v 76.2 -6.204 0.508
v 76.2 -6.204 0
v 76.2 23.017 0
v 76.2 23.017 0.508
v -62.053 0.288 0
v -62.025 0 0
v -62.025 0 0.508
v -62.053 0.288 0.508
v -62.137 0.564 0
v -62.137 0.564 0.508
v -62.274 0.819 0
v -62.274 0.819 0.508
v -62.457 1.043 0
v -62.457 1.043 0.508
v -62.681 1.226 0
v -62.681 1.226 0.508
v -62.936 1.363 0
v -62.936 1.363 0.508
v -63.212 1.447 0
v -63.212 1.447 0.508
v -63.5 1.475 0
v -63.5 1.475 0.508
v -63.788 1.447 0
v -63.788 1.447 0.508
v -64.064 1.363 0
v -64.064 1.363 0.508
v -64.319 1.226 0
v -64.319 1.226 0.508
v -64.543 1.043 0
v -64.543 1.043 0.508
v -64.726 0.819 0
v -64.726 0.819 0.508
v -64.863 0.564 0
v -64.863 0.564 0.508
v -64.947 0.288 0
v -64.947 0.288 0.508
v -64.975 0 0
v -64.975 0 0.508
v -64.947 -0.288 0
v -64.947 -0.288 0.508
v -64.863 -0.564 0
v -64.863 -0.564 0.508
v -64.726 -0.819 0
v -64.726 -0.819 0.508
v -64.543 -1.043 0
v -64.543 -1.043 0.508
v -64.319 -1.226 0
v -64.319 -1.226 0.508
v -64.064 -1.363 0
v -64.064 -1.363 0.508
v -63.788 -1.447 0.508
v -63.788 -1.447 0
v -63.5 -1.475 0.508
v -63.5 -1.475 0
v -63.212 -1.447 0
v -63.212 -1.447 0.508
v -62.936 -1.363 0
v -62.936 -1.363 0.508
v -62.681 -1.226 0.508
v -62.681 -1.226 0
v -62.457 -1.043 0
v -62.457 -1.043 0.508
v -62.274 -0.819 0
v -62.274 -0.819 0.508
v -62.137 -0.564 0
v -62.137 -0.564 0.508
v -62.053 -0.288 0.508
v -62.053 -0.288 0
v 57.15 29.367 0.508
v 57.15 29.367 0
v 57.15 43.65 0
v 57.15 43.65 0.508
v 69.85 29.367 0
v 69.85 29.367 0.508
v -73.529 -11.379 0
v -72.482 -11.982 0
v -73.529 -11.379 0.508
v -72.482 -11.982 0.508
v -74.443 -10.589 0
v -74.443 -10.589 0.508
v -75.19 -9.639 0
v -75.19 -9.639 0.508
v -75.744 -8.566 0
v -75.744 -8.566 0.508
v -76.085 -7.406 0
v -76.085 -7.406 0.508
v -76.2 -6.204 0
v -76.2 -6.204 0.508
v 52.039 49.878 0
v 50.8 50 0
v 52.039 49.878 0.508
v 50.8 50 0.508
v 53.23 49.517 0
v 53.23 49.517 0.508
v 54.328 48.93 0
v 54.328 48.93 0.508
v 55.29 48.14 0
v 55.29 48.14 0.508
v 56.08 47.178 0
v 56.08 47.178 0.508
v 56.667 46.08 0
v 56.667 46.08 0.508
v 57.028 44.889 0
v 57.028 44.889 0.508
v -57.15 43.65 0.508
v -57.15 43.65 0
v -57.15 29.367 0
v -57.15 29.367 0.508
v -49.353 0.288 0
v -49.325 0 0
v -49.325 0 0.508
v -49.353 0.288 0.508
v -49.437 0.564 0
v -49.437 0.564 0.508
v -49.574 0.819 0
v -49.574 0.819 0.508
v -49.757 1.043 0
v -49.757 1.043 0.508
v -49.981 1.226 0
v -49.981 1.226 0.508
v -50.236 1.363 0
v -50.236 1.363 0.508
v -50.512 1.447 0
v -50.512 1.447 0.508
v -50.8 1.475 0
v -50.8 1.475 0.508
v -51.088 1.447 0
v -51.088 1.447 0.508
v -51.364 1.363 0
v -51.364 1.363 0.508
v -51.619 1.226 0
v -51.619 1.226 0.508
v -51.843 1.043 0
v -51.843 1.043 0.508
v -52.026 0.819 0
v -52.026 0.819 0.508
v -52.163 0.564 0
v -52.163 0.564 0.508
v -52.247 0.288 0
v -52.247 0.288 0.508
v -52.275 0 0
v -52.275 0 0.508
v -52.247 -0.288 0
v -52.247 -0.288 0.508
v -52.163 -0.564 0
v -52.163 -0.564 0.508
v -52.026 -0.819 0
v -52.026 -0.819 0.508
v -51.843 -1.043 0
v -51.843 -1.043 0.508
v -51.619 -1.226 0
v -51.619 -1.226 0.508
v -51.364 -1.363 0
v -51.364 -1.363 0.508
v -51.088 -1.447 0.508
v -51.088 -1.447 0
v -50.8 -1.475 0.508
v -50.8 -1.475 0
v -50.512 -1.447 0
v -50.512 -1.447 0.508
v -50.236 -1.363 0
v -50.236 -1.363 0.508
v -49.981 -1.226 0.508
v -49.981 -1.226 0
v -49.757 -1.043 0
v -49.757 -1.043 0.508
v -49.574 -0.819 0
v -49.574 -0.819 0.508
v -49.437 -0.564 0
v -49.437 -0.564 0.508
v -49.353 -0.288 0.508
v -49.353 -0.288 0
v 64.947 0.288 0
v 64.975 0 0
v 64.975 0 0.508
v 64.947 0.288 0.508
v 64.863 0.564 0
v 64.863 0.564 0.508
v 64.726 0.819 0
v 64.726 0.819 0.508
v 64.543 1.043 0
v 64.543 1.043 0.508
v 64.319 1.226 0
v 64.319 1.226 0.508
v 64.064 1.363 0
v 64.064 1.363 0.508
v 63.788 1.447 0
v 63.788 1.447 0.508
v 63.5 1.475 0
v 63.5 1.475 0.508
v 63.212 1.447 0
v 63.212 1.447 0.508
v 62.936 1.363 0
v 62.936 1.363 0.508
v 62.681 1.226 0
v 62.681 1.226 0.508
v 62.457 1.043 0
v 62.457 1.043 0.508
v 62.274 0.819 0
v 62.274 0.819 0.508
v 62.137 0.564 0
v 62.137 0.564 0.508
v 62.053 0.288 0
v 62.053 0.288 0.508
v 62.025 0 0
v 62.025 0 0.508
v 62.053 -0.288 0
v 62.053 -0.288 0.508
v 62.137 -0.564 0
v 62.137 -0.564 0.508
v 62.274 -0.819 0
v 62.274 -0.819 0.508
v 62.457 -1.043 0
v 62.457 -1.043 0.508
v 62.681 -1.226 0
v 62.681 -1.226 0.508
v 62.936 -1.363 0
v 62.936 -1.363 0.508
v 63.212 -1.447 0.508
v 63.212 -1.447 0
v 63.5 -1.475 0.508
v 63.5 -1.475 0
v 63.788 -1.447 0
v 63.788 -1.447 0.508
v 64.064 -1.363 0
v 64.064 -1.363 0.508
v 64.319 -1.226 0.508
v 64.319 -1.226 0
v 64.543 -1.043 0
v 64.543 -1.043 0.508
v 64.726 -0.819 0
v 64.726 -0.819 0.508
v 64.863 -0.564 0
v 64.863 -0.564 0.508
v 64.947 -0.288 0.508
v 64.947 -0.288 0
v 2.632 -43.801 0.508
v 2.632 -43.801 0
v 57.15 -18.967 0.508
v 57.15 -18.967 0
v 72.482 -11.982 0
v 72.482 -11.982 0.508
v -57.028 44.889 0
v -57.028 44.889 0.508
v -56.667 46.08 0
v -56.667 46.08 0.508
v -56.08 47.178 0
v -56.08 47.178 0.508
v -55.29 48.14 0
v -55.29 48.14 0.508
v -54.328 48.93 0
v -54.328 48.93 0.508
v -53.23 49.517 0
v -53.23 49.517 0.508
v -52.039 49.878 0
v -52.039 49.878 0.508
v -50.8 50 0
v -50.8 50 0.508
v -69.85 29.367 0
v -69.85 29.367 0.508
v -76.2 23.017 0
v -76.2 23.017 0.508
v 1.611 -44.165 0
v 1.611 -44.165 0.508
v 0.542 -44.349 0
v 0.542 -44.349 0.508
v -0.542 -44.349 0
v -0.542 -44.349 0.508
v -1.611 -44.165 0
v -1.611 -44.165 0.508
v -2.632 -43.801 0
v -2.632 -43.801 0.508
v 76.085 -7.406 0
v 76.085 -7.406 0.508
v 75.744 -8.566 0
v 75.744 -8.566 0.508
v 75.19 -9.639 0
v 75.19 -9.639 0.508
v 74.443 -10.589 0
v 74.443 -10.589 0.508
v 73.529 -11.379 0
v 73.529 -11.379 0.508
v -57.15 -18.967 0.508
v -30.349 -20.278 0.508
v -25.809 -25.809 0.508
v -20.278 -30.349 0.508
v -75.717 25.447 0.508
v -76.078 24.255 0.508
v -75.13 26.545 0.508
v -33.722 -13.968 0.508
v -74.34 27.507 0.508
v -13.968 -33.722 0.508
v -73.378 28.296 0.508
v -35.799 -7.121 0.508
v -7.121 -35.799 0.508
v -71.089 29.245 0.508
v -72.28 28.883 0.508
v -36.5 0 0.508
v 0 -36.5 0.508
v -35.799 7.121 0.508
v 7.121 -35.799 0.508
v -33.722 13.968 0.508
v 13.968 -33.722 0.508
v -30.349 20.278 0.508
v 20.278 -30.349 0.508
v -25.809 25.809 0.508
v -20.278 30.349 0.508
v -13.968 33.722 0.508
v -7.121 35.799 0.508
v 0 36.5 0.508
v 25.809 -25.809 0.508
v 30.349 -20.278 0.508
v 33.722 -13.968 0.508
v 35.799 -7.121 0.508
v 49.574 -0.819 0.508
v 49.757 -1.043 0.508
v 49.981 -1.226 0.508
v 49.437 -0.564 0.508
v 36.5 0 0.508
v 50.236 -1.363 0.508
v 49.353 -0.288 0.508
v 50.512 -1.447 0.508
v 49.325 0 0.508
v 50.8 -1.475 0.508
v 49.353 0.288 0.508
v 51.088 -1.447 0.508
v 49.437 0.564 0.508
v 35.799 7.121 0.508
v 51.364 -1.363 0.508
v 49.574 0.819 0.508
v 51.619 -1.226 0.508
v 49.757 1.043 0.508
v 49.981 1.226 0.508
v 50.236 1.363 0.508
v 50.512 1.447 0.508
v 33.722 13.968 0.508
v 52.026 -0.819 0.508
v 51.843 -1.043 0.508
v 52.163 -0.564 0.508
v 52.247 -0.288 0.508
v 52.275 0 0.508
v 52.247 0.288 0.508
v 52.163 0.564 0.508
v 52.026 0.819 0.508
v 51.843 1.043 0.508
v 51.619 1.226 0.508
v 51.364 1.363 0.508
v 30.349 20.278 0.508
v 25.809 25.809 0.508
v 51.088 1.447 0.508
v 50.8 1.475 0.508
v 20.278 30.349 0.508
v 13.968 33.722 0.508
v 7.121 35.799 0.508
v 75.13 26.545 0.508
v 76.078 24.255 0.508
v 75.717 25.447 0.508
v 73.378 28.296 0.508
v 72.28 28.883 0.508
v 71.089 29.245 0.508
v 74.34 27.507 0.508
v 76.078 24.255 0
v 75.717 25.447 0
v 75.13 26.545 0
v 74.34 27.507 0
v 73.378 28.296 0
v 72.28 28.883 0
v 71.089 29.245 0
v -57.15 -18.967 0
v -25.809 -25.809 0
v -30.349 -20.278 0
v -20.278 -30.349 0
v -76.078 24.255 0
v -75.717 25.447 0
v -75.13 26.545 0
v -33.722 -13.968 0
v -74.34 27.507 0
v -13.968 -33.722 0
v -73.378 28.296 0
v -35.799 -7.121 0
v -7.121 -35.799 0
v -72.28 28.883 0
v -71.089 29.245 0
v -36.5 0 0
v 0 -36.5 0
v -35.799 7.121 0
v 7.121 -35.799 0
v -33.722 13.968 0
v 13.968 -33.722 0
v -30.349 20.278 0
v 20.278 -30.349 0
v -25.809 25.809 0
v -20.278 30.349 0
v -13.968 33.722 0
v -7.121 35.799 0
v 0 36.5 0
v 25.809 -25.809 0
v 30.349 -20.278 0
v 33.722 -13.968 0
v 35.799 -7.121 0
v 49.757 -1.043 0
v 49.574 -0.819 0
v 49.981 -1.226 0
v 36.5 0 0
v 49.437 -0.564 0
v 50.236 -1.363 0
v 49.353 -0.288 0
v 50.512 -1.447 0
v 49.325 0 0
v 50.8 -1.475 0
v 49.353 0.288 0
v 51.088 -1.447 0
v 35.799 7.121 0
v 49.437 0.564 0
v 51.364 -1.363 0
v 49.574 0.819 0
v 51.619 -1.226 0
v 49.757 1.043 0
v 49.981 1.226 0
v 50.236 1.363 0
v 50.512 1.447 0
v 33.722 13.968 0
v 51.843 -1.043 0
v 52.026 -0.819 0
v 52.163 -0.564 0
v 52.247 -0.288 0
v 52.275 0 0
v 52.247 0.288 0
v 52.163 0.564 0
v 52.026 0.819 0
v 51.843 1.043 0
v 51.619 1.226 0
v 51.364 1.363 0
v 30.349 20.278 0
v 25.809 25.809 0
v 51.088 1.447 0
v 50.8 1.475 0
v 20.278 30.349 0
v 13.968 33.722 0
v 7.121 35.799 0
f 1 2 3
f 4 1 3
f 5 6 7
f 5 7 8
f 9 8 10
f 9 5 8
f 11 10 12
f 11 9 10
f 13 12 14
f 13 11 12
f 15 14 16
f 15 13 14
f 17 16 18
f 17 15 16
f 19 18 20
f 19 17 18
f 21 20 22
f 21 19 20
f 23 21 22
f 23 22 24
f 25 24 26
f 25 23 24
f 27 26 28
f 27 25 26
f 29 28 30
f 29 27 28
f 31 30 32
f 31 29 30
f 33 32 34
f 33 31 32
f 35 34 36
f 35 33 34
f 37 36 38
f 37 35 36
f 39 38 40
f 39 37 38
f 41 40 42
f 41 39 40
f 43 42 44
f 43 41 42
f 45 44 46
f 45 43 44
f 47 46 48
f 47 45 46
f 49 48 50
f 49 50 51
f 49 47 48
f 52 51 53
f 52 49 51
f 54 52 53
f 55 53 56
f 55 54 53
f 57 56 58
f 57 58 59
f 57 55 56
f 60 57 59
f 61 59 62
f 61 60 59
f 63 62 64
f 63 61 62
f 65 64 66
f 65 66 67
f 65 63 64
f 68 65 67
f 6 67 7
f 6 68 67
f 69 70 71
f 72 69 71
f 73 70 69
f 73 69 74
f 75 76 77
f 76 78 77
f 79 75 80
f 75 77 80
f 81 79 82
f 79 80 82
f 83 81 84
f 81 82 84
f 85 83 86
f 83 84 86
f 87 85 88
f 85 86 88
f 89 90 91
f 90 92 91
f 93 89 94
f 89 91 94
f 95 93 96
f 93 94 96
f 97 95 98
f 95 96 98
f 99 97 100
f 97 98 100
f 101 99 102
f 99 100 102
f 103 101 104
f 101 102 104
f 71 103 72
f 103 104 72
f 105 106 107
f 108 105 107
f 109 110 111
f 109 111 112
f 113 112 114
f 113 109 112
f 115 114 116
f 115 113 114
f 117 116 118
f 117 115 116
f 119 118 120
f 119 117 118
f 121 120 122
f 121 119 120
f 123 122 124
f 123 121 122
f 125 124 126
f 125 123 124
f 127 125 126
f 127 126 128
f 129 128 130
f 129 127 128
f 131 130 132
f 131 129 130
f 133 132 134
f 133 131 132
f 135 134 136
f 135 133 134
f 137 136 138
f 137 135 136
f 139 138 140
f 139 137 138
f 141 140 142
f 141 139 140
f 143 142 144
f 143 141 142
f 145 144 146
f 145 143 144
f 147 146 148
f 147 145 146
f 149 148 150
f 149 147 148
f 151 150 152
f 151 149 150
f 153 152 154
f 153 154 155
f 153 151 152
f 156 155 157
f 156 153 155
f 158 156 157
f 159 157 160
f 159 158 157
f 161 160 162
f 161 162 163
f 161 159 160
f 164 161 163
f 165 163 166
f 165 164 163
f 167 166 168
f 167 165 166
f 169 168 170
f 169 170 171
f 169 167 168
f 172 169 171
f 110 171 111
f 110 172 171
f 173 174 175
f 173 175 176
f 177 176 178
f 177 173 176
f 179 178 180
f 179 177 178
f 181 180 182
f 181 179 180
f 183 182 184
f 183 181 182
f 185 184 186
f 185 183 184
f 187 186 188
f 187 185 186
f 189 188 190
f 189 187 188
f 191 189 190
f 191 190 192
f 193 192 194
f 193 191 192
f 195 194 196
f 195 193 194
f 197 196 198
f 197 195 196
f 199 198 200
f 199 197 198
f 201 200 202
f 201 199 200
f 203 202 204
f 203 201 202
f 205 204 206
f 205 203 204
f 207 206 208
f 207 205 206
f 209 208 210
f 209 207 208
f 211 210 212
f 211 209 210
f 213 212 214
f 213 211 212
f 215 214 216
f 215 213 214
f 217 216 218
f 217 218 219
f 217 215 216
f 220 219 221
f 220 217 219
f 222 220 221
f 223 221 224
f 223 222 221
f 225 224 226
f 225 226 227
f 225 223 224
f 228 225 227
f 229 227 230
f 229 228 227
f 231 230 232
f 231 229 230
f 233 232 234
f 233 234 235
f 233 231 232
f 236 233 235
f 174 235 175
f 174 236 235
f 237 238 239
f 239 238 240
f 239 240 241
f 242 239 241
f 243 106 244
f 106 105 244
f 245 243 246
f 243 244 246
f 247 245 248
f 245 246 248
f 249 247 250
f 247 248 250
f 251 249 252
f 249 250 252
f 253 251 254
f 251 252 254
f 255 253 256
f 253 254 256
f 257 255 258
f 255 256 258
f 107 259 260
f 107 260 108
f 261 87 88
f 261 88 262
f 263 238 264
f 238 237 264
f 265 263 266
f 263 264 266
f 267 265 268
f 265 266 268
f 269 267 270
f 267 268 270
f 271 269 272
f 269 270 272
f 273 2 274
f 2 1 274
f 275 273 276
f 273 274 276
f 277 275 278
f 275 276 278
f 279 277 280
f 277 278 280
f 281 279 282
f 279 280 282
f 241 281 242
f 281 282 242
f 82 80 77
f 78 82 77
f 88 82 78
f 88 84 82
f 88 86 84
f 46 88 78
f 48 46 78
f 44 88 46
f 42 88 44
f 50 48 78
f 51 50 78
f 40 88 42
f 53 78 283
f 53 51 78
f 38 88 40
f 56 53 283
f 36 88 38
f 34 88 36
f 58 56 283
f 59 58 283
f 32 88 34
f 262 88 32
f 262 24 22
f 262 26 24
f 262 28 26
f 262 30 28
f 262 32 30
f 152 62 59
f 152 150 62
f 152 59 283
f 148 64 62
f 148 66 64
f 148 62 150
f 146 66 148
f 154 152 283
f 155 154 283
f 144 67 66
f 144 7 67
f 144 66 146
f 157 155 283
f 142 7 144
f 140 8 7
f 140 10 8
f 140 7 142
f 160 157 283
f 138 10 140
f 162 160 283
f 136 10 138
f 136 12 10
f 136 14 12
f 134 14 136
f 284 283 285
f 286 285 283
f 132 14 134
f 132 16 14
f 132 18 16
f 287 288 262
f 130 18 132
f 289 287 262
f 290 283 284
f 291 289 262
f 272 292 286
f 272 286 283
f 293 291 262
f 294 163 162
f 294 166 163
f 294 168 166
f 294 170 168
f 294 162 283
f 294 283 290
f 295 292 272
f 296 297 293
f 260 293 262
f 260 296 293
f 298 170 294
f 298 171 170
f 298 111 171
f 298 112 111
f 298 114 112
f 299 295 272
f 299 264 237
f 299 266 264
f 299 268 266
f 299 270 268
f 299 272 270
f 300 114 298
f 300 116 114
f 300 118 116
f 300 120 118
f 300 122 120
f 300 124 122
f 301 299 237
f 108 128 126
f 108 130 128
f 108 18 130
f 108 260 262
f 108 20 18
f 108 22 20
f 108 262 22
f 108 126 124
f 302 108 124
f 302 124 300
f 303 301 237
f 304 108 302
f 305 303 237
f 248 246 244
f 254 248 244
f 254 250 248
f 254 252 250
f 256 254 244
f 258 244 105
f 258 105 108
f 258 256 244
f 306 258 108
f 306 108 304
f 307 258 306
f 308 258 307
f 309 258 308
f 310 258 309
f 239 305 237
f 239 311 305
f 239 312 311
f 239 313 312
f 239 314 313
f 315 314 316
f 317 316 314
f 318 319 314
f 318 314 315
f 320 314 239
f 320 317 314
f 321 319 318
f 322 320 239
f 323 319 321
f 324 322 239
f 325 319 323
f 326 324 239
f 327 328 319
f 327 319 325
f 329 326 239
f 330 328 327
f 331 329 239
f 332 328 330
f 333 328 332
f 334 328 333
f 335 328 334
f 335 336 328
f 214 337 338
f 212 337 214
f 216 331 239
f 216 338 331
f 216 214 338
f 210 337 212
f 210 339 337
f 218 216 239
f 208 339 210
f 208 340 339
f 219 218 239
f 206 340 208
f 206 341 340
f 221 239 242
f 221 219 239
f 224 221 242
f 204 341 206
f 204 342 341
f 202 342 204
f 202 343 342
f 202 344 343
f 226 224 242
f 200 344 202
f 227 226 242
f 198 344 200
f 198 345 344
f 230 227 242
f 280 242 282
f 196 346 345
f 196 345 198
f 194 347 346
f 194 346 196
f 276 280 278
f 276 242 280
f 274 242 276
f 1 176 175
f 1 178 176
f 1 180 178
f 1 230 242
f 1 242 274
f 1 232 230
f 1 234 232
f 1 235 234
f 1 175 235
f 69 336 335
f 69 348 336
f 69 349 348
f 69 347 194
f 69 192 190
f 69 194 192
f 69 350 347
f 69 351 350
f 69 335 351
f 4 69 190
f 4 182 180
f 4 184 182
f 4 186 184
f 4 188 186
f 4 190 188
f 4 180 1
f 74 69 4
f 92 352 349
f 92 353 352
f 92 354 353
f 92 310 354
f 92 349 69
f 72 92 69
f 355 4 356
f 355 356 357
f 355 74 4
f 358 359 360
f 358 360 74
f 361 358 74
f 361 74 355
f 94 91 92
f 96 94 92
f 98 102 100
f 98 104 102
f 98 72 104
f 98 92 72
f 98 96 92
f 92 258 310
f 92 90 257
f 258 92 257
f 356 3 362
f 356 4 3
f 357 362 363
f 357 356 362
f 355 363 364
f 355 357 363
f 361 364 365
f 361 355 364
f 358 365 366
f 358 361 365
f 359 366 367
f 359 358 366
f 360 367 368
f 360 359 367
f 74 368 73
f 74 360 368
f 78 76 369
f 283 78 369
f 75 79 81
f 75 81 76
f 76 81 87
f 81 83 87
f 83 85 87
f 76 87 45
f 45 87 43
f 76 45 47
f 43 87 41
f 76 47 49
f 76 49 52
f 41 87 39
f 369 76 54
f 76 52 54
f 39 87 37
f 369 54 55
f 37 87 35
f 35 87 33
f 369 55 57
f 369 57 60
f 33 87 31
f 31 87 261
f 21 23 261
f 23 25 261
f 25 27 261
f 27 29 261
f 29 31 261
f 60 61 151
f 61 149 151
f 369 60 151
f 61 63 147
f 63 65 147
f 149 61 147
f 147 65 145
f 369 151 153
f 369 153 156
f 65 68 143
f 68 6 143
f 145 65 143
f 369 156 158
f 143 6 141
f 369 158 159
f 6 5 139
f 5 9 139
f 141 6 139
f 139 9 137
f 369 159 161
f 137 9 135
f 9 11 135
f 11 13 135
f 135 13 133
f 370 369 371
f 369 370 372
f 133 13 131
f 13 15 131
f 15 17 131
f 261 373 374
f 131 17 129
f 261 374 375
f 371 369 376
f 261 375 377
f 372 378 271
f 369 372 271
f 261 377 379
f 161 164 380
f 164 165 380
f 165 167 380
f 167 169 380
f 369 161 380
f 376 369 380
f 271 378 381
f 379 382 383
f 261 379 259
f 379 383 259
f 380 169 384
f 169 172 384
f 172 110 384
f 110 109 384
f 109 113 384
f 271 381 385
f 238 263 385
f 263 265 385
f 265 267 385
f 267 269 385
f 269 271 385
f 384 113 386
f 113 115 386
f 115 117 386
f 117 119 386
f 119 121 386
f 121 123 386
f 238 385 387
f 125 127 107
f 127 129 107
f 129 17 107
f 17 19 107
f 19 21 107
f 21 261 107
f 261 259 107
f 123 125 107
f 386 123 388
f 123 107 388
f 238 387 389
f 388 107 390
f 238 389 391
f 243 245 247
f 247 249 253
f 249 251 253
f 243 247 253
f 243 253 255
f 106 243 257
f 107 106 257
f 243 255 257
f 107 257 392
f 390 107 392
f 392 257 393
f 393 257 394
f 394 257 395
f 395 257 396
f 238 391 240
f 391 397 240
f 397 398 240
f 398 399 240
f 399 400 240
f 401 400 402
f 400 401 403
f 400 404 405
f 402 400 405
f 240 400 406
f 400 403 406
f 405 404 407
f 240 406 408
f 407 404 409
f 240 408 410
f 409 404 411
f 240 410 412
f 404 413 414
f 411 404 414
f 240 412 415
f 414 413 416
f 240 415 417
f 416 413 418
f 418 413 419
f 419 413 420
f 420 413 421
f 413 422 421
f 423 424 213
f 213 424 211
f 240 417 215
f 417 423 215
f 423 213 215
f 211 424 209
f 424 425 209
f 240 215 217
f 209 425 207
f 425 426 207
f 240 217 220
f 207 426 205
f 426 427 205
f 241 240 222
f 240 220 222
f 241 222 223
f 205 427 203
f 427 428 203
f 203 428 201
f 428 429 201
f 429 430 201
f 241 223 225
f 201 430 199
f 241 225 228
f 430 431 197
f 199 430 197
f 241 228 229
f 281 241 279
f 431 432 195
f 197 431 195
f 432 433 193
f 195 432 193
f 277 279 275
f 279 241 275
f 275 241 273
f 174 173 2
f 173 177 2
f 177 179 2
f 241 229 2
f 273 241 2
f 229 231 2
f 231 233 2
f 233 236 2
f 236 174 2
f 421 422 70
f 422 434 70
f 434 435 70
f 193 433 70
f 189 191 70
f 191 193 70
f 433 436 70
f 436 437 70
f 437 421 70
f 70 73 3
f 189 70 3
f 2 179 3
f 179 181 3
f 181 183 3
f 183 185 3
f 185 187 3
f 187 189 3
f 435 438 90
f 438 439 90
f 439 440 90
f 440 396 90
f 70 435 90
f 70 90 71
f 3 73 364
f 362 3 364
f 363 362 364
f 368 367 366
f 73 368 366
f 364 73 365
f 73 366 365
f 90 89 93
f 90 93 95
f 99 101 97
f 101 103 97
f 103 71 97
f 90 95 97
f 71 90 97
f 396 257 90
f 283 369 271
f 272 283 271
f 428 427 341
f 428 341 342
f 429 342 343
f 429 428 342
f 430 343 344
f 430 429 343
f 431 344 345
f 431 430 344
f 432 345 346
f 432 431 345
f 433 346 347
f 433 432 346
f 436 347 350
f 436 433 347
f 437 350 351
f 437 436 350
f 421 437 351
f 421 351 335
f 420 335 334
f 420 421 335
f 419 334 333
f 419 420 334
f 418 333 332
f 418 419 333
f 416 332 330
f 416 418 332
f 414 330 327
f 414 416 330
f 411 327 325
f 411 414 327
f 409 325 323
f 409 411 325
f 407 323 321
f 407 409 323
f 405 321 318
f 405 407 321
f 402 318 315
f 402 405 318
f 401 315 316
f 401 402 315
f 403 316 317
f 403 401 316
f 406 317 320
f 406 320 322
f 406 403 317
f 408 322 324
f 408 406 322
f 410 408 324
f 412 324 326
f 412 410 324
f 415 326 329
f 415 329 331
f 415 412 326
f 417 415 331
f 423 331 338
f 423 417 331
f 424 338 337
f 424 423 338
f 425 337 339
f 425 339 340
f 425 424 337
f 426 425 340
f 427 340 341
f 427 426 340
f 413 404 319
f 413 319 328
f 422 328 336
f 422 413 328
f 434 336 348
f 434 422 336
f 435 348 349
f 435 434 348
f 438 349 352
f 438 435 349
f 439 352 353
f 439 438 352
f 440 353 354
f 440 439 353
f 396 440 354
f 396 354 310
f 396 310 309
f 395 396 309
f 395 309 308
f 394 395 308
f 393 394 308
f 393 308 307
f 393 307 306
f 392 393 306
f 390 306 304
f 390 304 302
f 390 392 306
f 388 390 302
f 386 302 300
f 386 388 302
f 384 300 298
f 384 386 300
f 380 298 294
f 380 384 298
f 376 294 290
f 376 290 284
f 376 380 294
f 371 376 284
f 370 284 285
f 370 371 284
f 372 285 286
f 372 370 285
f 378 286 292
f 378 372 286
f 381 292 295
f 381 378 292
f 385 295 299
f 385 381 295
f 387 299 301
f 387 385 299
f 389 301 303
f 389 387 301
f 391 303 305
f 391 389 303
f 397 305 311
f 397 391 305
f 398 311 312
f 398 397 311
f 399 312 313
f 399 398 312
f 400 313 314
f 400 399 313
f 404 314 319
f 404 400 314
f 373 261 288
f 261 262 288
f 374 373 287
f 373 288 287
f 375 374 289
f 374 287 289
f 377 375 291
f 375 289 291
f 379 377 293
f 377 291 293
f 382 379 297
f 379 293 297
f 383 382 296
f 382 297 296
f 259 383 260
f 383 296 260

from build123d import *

# Parameters (mm, degrees)
SKETCH2_R           = 1.475
SKETCH2_R_2         = 36.5
SKETCH2_W           = 19.05
SKETCH2_H           = 25.4
SKETCH2_H_2         = 7.933333334
BOSS_EXTRUDE1_DEPTH = 0.508
FILLET1_R           = 6.35


with BuildPart() as part:
    # Sketch2 → Boss-Extrude1 (new body)
    # profile 1 of 7: a face of its own
    with BuildSketch(Plane.XY):
        Polygon((57.15, 50), (-57.15, 50), (-57.15, 29.366666667), (-57.15, 3.966666667), (-57.15, -3.966666667), (-57.15, -18.966666667), (0, -45), (57.15, -18.966666667), (57.15, -3.966666667), (57.15, 3.966666667), (57.15, 29.366666667), align=None)
        with Locations((-50.8, 0)):
            Circle(SKETCH2_R, mode=Mode.SUBTRACT)
        Circle(SKETCH2_R_2, mode=Mode.SUBTRACT)
        with Locations((50.8, 0)):
            Circle(SKETCH2_R, mode=Mode.SUBTRACT)
    # profile 2 of 7: a face of its own
    with BuildSketch(Plane.XY):
        with Locations((-66.675, 16.666666667)):
            Rectangle(SKETCH2_W, SKETCH2_H)
    # profile 3 of 7: a face of its own
    with BuildSketch(Plane.XY):
        with Locations((-66.675, 0)):
            Rectangle(SKETCH2_W, SKETCH2_H_2)
        with Locations((-63.5, 0)):
            Circle(SKETCH2_R, mode=Mode.SUBTRACT)
    # profile 4 of 7: a face of its own
    with BuildSketch(Plane.XY):
        Polygon((-57.15, -18.966666667), (-57.15, -3.966666667), (-76.2, -3.966666667), (-76.2, -10.288888889), align=None)
    # profile 5 of 7: a face of its own
    with BuildSketch(Plane.XY):
        Polygon((76.2, -3.966666667), (57.15, -3.966666667), (57.15, -18.966666667), (76.2, -10.288888889), align=None)
    # profile 6 of 7: a face of its own
    with BuildSketch(Plane.XY):
        with Locations((66.675, 0)):
            Rectangle(SKETCH2_W, SKETCH2_H_2)
        with Locations((63.5, 0)):
            Circle(SKETCH2_R, mode=Mode.SUBTRACT)
    # profile 7 of 7: a face of its own
    with BuildSketch(Plane.XY):
        with Locations((66.675, 16.666666667)):
            Rectangle(SKETCH2_W, SKETCH2_H)
    extrude(amount=BOSS_EXTRUDE1_DEPTH)

    # Fillet1
    fillet1_edges = [part.edges().sort_by_distance(p)[0] for p in [
        (0, -45, 0.254),
        (-76.2, -10.288888889, 0.254),
        (-76.2, 29.366666667, 0.254),
        (-57.15, 50, 0.254),
        (57.15, 50, 0.254),
        (76.2, 29.366666667, 0.254),
        (76.2, -10.288888889, 0.254),
    ]]
    fillet(fillet1_edges, radius=FILLET1_R)


solid = part.part
